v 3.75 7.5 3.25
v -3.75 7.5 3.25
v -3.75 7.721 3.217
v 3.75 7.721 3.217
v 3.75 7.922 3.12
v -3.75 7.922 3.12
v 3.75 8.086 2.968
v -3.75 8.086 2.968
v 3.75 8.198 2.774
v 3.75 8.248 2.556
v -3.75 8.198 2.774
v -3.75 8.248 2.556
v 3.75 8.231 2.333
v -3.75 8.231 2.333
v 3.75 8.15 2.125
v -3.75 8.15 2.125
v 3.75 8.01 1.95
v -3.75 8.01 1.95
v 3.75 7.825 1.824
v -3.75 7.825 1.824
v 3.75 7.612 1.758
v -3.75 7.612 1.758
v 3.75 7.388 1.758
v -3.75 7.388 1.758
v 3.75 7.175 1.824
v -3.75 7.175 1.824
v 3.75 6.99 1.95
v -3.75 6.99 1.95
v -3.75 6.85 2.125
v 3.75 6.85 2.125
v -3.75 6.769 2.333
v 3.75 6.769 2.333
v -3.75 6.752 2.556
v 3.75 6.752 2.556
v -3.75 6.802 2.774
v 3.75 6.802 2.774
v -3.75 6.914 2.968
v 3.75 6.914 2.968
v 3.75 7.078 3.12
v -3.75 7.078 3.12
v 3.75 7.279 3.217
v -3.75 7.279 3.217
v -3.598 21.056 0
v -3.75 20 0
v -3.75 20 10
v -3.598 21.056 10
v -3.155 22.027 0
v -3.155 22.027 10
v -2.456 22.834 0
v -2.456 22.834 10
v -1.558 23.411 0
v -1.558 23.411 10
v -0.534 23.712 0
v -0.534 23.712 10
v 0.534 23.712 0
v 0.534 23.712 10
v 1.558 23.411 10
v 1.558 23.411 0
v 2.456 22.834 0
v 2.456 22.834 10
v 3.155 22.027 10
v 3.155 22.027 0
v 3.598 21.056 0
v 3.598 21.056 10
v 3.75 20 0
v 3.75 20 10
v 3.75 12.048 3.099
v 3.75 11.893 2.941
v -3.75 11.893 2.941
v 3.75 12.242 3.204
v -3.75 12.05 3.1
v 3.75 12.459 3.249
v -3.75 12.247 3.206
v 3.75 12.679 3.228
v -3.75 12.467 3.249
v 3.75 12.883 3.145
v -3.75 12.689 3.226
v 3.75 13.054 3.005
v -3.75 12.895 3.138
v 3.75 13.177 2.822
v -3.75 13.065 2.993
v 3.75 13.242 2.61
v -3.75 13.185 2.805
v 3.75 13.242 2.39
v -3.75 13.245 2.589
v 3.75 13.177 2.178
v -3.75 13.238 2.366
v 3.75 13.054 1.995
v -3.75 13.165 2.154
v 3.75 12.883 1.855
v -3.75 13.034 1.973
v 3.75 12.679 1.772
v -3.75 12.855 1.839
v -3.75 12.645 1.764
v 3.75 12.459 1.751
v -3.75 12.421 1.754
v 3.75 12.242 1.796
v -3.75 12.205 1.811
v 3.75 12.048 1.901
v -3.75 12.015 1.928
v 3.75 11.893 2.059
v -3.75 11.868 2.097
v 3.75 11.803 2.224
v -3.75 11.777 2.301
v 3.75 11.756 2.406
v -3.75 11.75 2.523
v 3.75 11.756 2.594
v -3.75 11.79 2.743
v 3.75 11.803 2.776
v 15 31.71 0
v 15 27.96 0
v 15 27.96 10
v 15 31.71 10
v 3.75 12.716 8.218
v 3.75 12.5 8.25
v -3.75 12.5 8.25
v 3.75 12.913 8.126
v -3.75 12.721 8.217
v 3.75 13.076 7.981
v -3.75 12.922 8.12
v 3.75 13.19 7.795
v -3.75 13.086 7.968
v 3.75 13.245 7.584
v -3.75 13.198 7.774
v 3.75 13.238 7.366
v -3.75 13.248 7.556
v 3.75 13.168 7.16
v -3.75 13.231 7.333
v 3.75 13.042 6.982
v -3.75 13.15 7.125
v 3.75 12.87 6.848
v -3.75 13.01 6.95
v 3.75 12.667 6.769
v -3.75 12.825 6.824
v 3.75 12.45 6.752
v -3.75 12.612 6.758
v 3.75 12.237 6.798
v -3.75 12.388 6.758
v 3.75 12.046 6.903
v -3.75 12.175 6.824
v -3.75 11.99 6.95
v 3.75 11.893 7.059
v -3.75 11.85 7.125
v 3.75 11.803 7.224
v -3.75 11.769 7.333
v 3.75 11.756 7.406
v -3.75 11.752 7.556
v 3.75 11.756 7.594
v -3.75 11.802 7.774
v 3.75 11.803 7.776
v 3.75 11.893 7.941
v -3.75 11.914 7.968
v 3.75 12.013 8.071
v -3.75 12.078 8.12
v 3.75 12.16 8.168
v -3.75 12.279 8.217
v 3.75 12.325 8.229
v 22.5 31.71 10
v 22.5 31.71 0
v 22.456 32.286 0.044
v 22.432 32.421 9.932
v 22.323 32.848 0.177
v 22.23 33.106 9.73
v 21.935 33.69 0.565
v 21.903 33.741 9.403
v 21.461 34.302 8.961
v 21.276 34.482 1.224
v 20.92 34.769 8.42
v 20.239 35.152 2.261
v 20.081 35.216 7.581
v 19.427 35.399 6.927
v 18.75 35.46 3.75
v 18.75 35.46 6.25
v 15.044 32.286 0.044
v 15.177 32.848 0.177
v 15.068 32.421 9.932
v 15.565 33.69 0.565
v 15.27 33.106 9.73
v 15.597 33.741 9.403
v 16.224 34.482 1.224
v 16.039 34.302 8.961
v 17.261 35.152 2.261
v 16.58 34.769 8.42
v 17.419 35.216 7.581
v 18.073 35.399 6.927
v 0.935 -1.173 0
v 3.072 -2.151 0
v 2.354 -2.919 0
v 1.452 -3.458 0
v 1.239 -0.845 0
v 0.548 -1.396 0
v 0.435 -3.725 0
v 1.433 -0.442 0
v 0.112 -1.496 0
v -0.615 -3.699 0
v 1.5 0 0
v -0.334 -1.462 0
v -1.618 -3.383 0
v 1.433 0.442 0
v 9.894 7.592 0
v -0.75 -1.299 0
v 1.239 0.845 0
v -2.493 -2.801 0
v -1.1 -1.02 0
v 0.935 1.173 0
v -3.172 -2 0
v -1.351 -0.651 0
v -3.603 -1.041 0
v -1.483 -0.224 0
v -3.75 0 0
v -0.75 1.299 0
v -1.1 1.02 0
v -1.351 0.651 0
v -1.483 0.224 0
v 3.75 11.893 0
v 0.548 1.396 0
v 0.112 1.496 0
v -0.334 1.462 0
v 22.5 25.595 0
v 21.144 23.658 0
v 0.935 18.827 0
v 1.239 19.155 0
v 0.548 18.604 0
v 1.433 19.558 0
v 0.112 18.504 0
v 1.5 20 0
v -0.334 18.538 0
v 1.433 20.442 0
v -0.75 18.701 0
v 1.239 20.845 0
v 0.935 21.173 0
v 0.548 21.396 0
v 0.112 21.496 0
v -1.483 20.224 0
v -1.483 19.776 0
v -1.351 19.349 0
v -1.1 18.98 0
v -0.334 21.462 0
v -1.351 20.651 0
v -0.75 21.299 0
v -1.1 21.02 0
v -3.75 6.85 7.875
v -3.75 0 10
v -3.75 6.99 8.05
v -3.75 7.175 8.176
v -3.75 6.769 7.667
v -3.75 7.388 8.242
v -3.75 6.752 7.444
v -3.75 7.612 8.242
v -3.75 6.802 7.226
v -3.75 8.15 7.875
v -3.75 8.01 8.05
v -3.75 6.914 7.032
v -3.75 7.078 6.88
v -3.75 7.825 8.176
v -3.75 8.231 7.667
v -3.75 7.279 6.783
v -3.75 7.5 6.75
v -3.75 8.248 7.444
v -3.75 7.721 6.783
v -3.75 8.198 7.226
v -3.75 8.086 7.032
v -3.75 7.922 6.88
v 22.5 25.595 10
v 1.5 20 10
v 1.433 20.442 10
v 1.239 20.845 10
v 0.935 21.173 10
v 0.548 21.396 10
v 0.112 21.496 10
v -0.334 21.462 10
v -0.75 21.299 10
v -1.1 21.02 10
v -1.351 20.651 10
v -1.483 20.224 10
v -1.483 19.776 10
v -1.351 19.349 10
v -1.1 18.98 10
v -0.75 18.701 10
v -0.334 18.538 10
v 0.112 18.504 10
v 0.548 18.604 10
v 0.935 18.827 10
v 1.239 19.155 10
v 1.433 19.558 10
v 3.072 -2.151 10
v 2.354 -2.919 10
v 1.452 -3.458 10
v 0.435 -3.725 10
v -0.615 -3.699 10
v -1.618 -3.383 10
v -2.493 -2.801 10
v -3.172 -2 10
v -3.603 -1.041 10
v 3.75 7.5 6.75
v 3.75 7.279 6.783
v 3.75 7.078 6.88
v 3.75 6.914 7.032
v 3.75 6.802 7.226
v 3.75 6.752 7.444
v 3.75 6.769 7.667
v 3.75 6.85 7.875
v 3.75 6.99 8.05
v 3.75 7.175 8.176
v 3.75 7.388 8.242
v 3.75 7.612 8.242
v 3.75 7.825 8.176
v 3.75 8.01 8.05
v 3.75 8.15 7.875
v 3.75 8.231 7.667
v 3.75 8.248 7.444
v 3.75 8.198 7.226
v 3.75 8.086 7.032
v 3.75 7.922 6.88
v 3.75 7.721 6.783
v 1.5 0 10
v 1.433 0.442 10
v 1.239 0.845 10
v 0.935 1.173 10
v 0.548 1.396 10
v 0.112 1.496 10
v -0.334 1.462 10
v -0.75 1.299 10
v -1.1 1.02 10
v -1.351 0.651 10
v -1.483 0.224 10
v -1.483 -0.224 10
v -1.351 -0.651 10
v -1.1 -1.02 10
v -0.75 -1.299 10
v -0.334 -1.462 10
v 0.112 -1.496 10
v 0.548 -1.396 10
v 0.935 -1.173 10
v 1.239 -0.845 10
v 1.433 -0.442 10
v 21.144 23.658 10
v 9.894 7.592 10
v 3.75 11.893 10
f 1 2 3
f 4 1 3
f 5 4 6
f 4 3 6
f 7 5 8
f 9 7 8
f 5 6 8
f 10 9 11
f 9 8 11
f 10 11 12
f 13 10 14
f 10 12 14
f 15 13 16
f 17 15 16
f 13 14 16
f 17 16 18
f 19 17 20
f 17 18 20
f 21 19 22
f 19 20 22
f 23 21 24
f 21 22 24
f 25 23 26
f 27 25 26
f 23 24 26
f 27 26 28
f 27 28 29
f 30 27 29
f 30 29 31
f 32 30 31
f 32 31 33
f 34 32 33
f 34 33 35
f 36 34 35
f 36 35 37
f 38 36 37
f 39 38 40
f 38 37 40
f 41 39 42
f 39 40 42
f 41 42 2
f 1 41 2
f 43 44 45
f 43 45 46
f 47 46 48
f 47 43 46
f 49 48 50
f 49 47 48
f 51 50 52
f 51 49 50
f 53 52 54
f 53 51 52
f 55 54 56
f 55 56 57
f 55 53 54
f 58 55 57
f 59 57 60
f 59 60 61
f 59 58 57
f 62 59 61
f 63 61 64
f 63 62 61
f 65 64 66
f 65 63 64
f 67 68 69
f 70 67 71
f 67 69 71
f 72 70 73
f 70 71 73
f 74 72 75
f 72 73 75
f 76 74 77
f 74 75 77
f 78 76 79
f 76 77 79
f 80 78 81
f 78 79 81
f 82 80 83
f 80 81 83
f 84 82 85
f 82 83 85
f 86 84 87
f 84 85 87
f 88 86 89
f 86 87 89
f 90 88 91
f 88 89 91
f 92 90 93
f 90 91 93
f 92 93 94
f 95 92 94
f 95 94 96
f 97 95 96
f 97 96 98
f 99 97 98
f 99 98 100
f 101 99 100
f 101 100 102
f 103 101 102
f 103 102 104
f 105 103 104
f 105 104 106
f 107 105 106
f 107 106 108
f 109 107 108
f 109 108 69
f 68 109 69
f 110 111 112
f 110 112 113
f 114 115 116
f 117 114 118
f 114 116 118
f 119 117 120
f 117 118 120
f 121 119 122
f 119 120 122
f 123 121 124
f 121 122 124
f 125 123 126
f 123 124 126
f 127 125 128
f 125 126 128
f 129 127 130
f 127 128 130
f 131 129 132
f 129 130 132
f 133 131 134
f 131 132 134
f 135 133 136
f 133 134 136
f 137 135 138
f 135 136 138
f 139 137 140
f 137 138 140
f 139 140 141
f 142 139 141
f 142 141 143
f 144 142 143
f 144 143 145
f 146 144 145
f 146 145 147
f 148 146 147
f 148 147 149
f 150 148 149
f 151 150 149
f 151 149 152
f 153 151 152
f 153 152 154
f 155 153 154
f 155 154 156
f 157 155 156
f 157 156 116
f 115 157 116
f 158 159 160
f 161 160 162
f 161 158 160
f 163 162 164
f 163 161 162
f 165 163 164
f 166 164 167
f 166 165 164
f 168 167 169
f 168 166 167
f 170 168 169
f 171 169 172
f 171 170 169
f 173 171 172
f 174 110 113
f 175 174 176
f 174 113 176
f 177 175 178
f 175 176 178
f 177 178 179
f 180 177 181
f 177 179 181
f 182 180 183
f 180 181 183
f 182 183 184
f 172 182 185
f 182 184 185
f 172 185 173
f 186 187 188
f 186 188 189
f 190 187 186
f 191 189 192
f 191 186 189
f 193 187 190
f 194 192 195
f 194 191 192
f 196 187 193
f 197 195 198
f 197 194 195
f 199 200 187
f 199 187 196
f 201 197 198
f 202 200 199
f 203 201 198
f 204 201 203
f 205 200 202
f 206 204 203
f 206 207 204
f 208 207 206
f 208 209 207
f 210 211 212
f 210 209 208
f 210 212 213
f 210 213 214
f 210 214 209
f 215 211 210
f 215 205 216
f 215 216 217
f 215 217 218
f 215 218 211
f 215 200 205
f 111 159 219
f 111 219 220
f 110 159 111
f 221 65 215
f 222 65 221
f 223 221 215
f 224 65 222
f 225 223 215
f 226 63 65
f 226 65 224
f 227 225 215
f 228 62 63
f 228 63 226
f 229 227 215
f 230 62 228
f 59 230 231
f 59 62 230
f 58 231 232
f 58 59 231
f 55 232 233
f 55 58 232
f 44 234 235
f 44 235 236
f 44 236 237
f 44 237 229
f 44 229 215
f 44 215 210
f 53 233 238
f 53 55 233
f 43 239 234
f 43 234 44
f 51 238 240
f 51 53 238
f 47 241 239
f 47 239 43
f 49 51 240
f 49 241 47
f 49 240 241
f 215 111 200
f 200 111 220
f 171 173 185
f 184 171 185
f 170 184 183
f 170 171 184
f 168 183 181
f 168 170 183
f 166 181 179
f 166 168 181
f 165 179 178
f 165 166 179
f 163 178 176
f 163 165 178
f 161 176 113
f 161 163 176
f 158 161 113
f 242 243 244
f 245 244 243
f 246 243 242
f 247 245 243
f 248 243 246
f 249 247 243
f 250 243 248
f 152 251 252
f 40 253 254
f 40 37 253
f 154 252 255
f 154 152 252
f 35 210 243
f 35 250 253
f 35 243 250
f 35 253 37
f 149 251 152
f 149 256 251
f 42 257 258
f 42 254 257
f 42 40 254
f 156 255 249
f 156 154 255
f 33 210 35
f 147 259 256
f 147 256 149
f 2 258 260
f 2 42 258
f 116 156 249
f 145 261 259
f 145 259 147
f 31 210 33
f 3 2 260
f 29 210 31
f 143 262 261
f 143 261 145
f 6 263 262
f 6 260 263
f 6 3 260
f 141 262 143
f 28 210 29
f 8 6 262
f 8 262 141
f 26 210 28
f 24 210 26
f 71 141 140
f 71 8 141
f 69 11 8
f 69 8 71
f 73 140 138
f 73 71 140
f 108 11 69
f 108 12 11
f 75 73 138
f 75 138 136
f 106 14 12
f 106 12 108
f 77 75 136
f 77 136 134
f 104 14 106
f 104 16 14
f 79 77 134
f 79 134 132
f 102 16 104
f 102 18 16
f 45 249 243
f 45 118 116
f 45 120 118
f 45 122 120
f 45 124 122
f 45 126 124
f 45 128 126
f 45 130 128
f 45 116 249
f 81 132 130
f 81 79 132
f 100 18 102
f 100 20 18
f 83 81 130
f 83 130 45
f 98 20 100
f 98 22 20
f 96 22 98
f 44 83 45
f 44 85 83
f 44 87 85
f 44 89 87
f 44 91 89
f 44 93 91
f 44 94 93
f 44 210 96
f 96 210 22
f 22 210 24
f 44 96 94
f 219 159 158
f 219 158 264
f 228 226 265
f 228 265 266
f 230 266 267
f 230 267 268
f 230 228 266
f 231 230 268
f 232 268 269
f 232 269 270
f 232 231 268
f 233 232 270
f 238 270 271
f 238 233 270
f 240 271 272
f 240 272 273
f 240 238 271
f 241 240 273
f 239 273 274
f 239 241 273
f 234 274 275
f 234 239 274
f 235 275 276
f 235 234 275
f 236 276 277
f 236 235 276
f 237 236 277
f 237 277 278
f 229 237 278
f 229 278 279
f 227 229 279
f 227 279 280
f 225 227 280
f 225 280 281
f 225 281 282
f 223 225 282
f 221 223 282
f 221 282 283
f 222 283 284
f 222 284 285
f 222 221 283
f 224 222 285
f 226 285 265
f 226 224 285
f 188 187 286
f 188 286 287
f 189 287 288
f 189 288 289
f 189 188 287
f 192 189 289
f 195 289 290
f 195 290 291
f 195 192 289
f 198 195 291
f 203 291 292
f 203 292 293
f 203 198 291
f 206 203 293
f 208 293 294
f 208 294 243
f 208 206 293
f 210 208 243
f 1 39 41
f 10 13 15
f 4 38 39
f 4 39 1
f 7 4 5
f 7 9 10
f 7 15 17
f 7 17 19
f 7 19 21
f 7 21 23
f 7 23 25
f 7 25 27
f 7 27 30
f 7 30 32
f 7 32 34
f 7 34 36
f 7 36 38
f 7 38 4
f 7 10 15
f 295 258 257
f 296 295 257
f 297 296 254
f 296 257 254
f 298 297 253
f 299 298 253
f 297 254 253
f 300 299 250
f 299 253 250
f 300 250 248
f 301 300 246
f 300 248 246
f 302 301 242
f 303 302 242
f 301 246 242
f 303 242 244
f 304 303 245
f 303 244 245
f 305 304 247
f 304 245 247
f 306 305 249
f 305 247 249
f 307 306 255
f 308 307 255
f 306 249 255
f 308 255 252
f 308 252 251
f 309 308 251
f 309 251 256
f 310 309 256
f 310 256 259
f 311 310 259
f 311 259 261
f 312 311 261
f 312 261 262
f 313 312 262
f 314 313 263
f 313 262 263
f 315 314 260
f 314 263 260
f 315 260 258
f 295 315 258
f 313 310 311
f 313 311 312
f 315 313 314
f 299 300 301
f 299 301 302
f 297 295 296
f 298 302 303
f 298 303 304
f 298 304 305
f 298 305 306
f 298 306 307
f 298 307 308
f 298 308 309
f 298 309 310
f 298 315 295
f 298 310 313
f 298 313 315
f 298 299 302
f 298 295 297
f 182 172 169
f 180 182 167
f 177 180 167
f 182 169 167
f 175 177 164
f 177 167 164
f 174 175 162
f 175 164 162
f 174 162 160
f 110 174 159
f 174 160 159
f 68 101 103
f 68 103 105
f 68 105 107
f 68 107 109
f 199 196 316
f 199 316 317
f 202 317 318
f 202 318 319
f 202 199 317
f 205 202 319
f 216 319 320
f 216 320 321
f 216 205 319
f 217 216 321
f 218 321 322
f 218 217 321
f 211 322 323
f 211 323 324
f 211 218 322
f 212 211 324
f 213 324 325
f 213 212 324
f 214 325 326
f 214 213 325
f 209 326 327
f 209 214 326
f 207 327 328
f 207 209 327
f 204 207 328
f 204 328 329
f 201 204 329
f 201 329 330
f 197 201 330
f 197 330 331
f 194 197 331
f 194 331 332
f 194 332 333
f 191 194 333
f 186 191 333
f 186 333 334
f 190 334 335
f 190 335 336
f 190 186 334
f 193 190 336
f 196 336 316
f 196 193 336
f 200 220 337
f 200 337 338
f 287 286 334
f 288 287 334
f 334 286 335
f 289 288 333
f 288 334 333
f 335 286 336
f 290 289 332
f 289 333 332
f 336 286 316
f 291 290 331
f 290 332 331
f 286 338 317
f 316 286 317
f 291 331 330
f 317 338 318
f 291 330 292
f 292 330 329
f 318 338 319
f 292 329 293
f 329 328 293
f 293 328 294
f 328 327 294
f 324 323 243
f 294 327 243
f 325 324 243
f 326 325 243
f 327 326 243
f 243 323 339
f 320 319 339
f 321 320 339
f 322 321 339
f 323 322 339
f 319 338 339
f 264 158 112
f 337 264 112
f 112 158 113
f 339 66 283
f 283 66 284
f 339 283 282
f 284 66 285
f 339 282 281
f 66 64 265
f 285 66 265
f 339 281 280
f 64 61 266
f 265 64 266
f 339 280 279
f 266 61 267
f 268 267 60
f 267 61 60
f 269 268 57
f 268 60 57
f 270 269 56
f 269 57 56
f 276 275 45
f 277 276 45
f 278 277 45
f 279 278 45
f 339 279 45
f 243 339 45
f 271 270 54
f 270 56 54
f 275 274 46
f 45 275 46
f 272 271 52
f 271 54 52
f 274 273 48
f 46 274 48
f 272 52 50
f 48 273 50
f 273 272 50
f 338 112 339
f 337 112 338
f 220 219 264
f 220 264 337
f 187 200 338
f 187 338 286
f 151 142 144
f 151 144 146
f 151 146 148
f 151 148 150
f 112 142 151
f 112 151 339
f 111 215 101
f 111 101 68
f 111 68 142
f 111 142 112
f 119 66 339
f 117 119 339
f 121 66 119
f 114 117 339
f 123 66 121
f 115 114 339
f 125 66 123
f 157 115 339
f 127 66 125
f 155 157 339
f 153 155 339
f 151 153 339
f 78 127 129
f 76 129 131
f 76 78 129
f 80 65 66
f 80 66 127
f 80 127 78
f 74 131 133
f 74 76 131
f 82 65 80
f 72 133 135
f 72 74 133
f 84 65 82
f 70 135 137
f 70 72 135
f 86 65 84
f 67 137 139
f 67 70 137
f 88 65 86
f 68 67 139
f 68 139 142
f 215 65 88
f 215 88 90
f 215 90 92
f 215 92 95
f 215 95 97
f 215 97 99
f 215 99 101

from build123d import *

# Parameters (mm, degrees)
SKETCH1_R           = 1.5
BOSS_EXTRUDE1_DEPTH = 10
FILLET1_R           = 3.75
SKETCH2_R           = 0.75
CUT_EXTRUDE1_DEPTH  = 7.5


with BuildPart() as part:
    # Sketch1 → Boss-Extrude1 (new body)
    with BuildSketch(Plane.XY):
        with BuildLine():
            Line((-3.75, 0), (-3.75, 20))
            ThreePointArc((-3.75, 20), (0, 23.75), (3.75, 20))
            Line((3.75, 20), (3.75, 11.893480509))
            Line((3.75, 11.893480509), (15, 27.960145585))
            Line((15, 27.960145585), (15, 35.460145585))
            Line((15, 35.460145585), (22.5, 35.460145585))
            Line((22.5, 35.460145585), (22.5, 25.595404668))
            Line((22.5, 25.595404668), (21.143640332, 23.658322312))
            Line((21.143640332, 23.658322312), (9.893640332, 7.591657236))
            Line((9.893640332, 7.591657236), (3.071820166, -2.150911636))
            ThreePointArc((3.071820166, -2.150911636), (-1.127646748, -3.576438565), (-3.75, 0))
        make_face()
        Circle(SKETCH1_R, mode=Mode.SUBTRACT)
        with Locations((0, 20)):
            Circle(SKETCH1_R, mode=Mode.SUBTRACT)
    extrude(amount=BOSS_EXTRUDE1_DEPTH)

    # Fillet1
    fillet1_edges = [part.edges().sort_by_distance(p)[0] for p in [
        (18.75, 35.460145585, 0),
        (22.5, 35.460145585, 5),
        (15, 35.460145585, 5),
        (18.75, 35.460145585, 10),
    ]]
    fillet(fillet1_edges, radius=FILLET1_R - 0.0001)  # a hair under: the kernel refuses the full size

    # Sketch2 → Cut-Extrude1 (cut)
    with BuildSketch(Plane.ZY.offset(3.75)):
        with Locations((7.5, 12.5)):
            Circle(SKETCH2_R)
        with Locations(Location((7.5, 7.5, 0), (0, 0, 180))):
            Circle(SKETCH2_R)
        with Locations((2.5, 7.5)):
            Circle(SKETCH2_R)
        with Locations(Location((2.5, 12.5, 0), (0, 0, 306.031603779))):
            Circle(SKETCH2_R)
    extrude(amount=-CUT_EXTRUDE1_DEPTH, mode=Mode.SUBTRACT)


solid = part.part
